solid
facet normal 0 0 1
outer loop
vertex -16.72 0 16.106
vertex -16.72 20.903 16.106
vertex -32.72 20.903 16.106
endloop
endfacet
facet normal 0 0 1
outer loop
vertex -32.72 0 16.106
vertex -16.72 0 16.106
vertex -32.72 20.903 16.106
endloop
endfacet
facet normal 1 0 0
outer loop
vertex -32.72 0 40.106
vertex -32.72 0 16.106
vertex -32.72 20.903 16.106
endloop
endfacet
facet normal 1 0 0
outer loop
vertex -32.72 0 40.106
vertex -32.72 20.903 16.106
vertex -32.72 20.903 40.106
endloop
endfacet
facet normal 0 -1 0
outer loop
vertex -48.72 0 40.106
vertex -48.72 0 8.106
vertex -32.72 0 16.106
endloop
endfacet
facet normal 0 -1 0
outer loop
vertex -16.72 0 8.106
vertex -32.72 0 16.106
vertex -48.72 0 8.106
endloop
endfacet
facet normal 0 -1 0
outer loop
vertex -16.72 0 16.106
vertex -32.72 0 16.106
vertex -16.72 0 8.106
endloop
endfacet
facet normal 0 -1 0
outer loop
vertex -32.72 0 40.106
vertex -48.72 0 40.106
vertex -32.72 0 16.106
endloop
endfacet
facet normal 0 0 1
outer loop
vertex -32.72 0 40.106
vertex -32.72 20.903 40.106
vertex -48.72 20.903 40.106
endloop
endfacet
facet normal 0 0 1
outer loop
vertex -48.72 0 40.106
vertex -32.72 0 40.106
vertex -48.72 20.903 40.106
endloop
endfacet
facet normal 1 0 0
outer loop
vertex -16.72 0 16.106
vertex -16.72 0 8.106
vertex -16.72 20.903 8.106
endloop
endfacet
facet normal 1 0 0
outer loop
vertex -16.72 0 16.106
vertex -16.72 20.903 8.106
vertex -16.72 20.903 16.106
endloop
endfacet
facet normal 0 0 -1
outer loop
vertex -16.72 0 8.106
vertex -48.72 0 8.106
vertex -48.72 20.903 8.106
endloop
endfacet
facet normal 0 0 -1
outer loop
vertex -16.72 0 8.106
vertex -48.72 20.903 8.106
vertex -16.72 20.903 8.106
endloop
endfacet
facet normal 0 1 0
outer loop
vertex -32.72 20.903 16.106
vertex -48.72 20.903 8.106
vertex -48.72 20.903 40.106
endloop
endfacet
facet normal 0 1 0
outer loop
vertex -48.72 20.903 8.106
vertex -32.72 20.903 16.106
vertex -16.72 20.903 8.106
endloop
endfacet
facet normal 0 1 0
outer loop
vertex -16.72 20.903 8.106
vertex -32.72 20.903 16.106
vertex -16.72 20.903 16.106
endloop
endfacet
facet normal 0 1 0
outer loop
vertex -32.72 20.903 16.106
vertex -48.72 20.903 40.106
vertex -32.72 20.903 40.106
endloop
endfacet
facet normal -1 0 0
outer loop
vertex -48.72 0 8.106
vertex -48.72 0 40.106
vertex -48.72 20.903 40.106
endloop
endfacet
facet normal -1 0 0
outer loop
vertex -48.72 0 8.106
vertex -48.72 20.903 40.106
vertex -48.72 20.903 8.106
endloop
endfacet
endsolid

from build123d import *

# Parameters (mm, degrees)
F0_W     = 8
F0_H     = 8
F0_H_2   = 16
F1_DEPTH = 20.90309


with BuildPart() as f1:
    # F0 (on Front) → F1 (new body)
    with BuildSketch(Plane.XZ):
        with Locations((-20.720104, 12.105988)):
            Rectangle(F0_W, F0_H)
        with Locations((-28.720104, 12.105988)):
            Rectangle(F0_W, F0_H)
        Polygon((-32.720104, 16.105988), (-32.720104, 24.105988), (-40.720104, 24.105988), (-48.720104, 24.105988), (-48.720104, 8.105988), (-32.720104, 8.105988), align=None)
        with Locations((-36.720104, 32.105988)):
            Rectangle(F0_W, F0_H_2)
        with Locations((-44.720104, 32.105988)):
            Rectangle(F0_W, F0_H_2)
    extrude(amount=-F1_DEPTH)


solid = f1.part
